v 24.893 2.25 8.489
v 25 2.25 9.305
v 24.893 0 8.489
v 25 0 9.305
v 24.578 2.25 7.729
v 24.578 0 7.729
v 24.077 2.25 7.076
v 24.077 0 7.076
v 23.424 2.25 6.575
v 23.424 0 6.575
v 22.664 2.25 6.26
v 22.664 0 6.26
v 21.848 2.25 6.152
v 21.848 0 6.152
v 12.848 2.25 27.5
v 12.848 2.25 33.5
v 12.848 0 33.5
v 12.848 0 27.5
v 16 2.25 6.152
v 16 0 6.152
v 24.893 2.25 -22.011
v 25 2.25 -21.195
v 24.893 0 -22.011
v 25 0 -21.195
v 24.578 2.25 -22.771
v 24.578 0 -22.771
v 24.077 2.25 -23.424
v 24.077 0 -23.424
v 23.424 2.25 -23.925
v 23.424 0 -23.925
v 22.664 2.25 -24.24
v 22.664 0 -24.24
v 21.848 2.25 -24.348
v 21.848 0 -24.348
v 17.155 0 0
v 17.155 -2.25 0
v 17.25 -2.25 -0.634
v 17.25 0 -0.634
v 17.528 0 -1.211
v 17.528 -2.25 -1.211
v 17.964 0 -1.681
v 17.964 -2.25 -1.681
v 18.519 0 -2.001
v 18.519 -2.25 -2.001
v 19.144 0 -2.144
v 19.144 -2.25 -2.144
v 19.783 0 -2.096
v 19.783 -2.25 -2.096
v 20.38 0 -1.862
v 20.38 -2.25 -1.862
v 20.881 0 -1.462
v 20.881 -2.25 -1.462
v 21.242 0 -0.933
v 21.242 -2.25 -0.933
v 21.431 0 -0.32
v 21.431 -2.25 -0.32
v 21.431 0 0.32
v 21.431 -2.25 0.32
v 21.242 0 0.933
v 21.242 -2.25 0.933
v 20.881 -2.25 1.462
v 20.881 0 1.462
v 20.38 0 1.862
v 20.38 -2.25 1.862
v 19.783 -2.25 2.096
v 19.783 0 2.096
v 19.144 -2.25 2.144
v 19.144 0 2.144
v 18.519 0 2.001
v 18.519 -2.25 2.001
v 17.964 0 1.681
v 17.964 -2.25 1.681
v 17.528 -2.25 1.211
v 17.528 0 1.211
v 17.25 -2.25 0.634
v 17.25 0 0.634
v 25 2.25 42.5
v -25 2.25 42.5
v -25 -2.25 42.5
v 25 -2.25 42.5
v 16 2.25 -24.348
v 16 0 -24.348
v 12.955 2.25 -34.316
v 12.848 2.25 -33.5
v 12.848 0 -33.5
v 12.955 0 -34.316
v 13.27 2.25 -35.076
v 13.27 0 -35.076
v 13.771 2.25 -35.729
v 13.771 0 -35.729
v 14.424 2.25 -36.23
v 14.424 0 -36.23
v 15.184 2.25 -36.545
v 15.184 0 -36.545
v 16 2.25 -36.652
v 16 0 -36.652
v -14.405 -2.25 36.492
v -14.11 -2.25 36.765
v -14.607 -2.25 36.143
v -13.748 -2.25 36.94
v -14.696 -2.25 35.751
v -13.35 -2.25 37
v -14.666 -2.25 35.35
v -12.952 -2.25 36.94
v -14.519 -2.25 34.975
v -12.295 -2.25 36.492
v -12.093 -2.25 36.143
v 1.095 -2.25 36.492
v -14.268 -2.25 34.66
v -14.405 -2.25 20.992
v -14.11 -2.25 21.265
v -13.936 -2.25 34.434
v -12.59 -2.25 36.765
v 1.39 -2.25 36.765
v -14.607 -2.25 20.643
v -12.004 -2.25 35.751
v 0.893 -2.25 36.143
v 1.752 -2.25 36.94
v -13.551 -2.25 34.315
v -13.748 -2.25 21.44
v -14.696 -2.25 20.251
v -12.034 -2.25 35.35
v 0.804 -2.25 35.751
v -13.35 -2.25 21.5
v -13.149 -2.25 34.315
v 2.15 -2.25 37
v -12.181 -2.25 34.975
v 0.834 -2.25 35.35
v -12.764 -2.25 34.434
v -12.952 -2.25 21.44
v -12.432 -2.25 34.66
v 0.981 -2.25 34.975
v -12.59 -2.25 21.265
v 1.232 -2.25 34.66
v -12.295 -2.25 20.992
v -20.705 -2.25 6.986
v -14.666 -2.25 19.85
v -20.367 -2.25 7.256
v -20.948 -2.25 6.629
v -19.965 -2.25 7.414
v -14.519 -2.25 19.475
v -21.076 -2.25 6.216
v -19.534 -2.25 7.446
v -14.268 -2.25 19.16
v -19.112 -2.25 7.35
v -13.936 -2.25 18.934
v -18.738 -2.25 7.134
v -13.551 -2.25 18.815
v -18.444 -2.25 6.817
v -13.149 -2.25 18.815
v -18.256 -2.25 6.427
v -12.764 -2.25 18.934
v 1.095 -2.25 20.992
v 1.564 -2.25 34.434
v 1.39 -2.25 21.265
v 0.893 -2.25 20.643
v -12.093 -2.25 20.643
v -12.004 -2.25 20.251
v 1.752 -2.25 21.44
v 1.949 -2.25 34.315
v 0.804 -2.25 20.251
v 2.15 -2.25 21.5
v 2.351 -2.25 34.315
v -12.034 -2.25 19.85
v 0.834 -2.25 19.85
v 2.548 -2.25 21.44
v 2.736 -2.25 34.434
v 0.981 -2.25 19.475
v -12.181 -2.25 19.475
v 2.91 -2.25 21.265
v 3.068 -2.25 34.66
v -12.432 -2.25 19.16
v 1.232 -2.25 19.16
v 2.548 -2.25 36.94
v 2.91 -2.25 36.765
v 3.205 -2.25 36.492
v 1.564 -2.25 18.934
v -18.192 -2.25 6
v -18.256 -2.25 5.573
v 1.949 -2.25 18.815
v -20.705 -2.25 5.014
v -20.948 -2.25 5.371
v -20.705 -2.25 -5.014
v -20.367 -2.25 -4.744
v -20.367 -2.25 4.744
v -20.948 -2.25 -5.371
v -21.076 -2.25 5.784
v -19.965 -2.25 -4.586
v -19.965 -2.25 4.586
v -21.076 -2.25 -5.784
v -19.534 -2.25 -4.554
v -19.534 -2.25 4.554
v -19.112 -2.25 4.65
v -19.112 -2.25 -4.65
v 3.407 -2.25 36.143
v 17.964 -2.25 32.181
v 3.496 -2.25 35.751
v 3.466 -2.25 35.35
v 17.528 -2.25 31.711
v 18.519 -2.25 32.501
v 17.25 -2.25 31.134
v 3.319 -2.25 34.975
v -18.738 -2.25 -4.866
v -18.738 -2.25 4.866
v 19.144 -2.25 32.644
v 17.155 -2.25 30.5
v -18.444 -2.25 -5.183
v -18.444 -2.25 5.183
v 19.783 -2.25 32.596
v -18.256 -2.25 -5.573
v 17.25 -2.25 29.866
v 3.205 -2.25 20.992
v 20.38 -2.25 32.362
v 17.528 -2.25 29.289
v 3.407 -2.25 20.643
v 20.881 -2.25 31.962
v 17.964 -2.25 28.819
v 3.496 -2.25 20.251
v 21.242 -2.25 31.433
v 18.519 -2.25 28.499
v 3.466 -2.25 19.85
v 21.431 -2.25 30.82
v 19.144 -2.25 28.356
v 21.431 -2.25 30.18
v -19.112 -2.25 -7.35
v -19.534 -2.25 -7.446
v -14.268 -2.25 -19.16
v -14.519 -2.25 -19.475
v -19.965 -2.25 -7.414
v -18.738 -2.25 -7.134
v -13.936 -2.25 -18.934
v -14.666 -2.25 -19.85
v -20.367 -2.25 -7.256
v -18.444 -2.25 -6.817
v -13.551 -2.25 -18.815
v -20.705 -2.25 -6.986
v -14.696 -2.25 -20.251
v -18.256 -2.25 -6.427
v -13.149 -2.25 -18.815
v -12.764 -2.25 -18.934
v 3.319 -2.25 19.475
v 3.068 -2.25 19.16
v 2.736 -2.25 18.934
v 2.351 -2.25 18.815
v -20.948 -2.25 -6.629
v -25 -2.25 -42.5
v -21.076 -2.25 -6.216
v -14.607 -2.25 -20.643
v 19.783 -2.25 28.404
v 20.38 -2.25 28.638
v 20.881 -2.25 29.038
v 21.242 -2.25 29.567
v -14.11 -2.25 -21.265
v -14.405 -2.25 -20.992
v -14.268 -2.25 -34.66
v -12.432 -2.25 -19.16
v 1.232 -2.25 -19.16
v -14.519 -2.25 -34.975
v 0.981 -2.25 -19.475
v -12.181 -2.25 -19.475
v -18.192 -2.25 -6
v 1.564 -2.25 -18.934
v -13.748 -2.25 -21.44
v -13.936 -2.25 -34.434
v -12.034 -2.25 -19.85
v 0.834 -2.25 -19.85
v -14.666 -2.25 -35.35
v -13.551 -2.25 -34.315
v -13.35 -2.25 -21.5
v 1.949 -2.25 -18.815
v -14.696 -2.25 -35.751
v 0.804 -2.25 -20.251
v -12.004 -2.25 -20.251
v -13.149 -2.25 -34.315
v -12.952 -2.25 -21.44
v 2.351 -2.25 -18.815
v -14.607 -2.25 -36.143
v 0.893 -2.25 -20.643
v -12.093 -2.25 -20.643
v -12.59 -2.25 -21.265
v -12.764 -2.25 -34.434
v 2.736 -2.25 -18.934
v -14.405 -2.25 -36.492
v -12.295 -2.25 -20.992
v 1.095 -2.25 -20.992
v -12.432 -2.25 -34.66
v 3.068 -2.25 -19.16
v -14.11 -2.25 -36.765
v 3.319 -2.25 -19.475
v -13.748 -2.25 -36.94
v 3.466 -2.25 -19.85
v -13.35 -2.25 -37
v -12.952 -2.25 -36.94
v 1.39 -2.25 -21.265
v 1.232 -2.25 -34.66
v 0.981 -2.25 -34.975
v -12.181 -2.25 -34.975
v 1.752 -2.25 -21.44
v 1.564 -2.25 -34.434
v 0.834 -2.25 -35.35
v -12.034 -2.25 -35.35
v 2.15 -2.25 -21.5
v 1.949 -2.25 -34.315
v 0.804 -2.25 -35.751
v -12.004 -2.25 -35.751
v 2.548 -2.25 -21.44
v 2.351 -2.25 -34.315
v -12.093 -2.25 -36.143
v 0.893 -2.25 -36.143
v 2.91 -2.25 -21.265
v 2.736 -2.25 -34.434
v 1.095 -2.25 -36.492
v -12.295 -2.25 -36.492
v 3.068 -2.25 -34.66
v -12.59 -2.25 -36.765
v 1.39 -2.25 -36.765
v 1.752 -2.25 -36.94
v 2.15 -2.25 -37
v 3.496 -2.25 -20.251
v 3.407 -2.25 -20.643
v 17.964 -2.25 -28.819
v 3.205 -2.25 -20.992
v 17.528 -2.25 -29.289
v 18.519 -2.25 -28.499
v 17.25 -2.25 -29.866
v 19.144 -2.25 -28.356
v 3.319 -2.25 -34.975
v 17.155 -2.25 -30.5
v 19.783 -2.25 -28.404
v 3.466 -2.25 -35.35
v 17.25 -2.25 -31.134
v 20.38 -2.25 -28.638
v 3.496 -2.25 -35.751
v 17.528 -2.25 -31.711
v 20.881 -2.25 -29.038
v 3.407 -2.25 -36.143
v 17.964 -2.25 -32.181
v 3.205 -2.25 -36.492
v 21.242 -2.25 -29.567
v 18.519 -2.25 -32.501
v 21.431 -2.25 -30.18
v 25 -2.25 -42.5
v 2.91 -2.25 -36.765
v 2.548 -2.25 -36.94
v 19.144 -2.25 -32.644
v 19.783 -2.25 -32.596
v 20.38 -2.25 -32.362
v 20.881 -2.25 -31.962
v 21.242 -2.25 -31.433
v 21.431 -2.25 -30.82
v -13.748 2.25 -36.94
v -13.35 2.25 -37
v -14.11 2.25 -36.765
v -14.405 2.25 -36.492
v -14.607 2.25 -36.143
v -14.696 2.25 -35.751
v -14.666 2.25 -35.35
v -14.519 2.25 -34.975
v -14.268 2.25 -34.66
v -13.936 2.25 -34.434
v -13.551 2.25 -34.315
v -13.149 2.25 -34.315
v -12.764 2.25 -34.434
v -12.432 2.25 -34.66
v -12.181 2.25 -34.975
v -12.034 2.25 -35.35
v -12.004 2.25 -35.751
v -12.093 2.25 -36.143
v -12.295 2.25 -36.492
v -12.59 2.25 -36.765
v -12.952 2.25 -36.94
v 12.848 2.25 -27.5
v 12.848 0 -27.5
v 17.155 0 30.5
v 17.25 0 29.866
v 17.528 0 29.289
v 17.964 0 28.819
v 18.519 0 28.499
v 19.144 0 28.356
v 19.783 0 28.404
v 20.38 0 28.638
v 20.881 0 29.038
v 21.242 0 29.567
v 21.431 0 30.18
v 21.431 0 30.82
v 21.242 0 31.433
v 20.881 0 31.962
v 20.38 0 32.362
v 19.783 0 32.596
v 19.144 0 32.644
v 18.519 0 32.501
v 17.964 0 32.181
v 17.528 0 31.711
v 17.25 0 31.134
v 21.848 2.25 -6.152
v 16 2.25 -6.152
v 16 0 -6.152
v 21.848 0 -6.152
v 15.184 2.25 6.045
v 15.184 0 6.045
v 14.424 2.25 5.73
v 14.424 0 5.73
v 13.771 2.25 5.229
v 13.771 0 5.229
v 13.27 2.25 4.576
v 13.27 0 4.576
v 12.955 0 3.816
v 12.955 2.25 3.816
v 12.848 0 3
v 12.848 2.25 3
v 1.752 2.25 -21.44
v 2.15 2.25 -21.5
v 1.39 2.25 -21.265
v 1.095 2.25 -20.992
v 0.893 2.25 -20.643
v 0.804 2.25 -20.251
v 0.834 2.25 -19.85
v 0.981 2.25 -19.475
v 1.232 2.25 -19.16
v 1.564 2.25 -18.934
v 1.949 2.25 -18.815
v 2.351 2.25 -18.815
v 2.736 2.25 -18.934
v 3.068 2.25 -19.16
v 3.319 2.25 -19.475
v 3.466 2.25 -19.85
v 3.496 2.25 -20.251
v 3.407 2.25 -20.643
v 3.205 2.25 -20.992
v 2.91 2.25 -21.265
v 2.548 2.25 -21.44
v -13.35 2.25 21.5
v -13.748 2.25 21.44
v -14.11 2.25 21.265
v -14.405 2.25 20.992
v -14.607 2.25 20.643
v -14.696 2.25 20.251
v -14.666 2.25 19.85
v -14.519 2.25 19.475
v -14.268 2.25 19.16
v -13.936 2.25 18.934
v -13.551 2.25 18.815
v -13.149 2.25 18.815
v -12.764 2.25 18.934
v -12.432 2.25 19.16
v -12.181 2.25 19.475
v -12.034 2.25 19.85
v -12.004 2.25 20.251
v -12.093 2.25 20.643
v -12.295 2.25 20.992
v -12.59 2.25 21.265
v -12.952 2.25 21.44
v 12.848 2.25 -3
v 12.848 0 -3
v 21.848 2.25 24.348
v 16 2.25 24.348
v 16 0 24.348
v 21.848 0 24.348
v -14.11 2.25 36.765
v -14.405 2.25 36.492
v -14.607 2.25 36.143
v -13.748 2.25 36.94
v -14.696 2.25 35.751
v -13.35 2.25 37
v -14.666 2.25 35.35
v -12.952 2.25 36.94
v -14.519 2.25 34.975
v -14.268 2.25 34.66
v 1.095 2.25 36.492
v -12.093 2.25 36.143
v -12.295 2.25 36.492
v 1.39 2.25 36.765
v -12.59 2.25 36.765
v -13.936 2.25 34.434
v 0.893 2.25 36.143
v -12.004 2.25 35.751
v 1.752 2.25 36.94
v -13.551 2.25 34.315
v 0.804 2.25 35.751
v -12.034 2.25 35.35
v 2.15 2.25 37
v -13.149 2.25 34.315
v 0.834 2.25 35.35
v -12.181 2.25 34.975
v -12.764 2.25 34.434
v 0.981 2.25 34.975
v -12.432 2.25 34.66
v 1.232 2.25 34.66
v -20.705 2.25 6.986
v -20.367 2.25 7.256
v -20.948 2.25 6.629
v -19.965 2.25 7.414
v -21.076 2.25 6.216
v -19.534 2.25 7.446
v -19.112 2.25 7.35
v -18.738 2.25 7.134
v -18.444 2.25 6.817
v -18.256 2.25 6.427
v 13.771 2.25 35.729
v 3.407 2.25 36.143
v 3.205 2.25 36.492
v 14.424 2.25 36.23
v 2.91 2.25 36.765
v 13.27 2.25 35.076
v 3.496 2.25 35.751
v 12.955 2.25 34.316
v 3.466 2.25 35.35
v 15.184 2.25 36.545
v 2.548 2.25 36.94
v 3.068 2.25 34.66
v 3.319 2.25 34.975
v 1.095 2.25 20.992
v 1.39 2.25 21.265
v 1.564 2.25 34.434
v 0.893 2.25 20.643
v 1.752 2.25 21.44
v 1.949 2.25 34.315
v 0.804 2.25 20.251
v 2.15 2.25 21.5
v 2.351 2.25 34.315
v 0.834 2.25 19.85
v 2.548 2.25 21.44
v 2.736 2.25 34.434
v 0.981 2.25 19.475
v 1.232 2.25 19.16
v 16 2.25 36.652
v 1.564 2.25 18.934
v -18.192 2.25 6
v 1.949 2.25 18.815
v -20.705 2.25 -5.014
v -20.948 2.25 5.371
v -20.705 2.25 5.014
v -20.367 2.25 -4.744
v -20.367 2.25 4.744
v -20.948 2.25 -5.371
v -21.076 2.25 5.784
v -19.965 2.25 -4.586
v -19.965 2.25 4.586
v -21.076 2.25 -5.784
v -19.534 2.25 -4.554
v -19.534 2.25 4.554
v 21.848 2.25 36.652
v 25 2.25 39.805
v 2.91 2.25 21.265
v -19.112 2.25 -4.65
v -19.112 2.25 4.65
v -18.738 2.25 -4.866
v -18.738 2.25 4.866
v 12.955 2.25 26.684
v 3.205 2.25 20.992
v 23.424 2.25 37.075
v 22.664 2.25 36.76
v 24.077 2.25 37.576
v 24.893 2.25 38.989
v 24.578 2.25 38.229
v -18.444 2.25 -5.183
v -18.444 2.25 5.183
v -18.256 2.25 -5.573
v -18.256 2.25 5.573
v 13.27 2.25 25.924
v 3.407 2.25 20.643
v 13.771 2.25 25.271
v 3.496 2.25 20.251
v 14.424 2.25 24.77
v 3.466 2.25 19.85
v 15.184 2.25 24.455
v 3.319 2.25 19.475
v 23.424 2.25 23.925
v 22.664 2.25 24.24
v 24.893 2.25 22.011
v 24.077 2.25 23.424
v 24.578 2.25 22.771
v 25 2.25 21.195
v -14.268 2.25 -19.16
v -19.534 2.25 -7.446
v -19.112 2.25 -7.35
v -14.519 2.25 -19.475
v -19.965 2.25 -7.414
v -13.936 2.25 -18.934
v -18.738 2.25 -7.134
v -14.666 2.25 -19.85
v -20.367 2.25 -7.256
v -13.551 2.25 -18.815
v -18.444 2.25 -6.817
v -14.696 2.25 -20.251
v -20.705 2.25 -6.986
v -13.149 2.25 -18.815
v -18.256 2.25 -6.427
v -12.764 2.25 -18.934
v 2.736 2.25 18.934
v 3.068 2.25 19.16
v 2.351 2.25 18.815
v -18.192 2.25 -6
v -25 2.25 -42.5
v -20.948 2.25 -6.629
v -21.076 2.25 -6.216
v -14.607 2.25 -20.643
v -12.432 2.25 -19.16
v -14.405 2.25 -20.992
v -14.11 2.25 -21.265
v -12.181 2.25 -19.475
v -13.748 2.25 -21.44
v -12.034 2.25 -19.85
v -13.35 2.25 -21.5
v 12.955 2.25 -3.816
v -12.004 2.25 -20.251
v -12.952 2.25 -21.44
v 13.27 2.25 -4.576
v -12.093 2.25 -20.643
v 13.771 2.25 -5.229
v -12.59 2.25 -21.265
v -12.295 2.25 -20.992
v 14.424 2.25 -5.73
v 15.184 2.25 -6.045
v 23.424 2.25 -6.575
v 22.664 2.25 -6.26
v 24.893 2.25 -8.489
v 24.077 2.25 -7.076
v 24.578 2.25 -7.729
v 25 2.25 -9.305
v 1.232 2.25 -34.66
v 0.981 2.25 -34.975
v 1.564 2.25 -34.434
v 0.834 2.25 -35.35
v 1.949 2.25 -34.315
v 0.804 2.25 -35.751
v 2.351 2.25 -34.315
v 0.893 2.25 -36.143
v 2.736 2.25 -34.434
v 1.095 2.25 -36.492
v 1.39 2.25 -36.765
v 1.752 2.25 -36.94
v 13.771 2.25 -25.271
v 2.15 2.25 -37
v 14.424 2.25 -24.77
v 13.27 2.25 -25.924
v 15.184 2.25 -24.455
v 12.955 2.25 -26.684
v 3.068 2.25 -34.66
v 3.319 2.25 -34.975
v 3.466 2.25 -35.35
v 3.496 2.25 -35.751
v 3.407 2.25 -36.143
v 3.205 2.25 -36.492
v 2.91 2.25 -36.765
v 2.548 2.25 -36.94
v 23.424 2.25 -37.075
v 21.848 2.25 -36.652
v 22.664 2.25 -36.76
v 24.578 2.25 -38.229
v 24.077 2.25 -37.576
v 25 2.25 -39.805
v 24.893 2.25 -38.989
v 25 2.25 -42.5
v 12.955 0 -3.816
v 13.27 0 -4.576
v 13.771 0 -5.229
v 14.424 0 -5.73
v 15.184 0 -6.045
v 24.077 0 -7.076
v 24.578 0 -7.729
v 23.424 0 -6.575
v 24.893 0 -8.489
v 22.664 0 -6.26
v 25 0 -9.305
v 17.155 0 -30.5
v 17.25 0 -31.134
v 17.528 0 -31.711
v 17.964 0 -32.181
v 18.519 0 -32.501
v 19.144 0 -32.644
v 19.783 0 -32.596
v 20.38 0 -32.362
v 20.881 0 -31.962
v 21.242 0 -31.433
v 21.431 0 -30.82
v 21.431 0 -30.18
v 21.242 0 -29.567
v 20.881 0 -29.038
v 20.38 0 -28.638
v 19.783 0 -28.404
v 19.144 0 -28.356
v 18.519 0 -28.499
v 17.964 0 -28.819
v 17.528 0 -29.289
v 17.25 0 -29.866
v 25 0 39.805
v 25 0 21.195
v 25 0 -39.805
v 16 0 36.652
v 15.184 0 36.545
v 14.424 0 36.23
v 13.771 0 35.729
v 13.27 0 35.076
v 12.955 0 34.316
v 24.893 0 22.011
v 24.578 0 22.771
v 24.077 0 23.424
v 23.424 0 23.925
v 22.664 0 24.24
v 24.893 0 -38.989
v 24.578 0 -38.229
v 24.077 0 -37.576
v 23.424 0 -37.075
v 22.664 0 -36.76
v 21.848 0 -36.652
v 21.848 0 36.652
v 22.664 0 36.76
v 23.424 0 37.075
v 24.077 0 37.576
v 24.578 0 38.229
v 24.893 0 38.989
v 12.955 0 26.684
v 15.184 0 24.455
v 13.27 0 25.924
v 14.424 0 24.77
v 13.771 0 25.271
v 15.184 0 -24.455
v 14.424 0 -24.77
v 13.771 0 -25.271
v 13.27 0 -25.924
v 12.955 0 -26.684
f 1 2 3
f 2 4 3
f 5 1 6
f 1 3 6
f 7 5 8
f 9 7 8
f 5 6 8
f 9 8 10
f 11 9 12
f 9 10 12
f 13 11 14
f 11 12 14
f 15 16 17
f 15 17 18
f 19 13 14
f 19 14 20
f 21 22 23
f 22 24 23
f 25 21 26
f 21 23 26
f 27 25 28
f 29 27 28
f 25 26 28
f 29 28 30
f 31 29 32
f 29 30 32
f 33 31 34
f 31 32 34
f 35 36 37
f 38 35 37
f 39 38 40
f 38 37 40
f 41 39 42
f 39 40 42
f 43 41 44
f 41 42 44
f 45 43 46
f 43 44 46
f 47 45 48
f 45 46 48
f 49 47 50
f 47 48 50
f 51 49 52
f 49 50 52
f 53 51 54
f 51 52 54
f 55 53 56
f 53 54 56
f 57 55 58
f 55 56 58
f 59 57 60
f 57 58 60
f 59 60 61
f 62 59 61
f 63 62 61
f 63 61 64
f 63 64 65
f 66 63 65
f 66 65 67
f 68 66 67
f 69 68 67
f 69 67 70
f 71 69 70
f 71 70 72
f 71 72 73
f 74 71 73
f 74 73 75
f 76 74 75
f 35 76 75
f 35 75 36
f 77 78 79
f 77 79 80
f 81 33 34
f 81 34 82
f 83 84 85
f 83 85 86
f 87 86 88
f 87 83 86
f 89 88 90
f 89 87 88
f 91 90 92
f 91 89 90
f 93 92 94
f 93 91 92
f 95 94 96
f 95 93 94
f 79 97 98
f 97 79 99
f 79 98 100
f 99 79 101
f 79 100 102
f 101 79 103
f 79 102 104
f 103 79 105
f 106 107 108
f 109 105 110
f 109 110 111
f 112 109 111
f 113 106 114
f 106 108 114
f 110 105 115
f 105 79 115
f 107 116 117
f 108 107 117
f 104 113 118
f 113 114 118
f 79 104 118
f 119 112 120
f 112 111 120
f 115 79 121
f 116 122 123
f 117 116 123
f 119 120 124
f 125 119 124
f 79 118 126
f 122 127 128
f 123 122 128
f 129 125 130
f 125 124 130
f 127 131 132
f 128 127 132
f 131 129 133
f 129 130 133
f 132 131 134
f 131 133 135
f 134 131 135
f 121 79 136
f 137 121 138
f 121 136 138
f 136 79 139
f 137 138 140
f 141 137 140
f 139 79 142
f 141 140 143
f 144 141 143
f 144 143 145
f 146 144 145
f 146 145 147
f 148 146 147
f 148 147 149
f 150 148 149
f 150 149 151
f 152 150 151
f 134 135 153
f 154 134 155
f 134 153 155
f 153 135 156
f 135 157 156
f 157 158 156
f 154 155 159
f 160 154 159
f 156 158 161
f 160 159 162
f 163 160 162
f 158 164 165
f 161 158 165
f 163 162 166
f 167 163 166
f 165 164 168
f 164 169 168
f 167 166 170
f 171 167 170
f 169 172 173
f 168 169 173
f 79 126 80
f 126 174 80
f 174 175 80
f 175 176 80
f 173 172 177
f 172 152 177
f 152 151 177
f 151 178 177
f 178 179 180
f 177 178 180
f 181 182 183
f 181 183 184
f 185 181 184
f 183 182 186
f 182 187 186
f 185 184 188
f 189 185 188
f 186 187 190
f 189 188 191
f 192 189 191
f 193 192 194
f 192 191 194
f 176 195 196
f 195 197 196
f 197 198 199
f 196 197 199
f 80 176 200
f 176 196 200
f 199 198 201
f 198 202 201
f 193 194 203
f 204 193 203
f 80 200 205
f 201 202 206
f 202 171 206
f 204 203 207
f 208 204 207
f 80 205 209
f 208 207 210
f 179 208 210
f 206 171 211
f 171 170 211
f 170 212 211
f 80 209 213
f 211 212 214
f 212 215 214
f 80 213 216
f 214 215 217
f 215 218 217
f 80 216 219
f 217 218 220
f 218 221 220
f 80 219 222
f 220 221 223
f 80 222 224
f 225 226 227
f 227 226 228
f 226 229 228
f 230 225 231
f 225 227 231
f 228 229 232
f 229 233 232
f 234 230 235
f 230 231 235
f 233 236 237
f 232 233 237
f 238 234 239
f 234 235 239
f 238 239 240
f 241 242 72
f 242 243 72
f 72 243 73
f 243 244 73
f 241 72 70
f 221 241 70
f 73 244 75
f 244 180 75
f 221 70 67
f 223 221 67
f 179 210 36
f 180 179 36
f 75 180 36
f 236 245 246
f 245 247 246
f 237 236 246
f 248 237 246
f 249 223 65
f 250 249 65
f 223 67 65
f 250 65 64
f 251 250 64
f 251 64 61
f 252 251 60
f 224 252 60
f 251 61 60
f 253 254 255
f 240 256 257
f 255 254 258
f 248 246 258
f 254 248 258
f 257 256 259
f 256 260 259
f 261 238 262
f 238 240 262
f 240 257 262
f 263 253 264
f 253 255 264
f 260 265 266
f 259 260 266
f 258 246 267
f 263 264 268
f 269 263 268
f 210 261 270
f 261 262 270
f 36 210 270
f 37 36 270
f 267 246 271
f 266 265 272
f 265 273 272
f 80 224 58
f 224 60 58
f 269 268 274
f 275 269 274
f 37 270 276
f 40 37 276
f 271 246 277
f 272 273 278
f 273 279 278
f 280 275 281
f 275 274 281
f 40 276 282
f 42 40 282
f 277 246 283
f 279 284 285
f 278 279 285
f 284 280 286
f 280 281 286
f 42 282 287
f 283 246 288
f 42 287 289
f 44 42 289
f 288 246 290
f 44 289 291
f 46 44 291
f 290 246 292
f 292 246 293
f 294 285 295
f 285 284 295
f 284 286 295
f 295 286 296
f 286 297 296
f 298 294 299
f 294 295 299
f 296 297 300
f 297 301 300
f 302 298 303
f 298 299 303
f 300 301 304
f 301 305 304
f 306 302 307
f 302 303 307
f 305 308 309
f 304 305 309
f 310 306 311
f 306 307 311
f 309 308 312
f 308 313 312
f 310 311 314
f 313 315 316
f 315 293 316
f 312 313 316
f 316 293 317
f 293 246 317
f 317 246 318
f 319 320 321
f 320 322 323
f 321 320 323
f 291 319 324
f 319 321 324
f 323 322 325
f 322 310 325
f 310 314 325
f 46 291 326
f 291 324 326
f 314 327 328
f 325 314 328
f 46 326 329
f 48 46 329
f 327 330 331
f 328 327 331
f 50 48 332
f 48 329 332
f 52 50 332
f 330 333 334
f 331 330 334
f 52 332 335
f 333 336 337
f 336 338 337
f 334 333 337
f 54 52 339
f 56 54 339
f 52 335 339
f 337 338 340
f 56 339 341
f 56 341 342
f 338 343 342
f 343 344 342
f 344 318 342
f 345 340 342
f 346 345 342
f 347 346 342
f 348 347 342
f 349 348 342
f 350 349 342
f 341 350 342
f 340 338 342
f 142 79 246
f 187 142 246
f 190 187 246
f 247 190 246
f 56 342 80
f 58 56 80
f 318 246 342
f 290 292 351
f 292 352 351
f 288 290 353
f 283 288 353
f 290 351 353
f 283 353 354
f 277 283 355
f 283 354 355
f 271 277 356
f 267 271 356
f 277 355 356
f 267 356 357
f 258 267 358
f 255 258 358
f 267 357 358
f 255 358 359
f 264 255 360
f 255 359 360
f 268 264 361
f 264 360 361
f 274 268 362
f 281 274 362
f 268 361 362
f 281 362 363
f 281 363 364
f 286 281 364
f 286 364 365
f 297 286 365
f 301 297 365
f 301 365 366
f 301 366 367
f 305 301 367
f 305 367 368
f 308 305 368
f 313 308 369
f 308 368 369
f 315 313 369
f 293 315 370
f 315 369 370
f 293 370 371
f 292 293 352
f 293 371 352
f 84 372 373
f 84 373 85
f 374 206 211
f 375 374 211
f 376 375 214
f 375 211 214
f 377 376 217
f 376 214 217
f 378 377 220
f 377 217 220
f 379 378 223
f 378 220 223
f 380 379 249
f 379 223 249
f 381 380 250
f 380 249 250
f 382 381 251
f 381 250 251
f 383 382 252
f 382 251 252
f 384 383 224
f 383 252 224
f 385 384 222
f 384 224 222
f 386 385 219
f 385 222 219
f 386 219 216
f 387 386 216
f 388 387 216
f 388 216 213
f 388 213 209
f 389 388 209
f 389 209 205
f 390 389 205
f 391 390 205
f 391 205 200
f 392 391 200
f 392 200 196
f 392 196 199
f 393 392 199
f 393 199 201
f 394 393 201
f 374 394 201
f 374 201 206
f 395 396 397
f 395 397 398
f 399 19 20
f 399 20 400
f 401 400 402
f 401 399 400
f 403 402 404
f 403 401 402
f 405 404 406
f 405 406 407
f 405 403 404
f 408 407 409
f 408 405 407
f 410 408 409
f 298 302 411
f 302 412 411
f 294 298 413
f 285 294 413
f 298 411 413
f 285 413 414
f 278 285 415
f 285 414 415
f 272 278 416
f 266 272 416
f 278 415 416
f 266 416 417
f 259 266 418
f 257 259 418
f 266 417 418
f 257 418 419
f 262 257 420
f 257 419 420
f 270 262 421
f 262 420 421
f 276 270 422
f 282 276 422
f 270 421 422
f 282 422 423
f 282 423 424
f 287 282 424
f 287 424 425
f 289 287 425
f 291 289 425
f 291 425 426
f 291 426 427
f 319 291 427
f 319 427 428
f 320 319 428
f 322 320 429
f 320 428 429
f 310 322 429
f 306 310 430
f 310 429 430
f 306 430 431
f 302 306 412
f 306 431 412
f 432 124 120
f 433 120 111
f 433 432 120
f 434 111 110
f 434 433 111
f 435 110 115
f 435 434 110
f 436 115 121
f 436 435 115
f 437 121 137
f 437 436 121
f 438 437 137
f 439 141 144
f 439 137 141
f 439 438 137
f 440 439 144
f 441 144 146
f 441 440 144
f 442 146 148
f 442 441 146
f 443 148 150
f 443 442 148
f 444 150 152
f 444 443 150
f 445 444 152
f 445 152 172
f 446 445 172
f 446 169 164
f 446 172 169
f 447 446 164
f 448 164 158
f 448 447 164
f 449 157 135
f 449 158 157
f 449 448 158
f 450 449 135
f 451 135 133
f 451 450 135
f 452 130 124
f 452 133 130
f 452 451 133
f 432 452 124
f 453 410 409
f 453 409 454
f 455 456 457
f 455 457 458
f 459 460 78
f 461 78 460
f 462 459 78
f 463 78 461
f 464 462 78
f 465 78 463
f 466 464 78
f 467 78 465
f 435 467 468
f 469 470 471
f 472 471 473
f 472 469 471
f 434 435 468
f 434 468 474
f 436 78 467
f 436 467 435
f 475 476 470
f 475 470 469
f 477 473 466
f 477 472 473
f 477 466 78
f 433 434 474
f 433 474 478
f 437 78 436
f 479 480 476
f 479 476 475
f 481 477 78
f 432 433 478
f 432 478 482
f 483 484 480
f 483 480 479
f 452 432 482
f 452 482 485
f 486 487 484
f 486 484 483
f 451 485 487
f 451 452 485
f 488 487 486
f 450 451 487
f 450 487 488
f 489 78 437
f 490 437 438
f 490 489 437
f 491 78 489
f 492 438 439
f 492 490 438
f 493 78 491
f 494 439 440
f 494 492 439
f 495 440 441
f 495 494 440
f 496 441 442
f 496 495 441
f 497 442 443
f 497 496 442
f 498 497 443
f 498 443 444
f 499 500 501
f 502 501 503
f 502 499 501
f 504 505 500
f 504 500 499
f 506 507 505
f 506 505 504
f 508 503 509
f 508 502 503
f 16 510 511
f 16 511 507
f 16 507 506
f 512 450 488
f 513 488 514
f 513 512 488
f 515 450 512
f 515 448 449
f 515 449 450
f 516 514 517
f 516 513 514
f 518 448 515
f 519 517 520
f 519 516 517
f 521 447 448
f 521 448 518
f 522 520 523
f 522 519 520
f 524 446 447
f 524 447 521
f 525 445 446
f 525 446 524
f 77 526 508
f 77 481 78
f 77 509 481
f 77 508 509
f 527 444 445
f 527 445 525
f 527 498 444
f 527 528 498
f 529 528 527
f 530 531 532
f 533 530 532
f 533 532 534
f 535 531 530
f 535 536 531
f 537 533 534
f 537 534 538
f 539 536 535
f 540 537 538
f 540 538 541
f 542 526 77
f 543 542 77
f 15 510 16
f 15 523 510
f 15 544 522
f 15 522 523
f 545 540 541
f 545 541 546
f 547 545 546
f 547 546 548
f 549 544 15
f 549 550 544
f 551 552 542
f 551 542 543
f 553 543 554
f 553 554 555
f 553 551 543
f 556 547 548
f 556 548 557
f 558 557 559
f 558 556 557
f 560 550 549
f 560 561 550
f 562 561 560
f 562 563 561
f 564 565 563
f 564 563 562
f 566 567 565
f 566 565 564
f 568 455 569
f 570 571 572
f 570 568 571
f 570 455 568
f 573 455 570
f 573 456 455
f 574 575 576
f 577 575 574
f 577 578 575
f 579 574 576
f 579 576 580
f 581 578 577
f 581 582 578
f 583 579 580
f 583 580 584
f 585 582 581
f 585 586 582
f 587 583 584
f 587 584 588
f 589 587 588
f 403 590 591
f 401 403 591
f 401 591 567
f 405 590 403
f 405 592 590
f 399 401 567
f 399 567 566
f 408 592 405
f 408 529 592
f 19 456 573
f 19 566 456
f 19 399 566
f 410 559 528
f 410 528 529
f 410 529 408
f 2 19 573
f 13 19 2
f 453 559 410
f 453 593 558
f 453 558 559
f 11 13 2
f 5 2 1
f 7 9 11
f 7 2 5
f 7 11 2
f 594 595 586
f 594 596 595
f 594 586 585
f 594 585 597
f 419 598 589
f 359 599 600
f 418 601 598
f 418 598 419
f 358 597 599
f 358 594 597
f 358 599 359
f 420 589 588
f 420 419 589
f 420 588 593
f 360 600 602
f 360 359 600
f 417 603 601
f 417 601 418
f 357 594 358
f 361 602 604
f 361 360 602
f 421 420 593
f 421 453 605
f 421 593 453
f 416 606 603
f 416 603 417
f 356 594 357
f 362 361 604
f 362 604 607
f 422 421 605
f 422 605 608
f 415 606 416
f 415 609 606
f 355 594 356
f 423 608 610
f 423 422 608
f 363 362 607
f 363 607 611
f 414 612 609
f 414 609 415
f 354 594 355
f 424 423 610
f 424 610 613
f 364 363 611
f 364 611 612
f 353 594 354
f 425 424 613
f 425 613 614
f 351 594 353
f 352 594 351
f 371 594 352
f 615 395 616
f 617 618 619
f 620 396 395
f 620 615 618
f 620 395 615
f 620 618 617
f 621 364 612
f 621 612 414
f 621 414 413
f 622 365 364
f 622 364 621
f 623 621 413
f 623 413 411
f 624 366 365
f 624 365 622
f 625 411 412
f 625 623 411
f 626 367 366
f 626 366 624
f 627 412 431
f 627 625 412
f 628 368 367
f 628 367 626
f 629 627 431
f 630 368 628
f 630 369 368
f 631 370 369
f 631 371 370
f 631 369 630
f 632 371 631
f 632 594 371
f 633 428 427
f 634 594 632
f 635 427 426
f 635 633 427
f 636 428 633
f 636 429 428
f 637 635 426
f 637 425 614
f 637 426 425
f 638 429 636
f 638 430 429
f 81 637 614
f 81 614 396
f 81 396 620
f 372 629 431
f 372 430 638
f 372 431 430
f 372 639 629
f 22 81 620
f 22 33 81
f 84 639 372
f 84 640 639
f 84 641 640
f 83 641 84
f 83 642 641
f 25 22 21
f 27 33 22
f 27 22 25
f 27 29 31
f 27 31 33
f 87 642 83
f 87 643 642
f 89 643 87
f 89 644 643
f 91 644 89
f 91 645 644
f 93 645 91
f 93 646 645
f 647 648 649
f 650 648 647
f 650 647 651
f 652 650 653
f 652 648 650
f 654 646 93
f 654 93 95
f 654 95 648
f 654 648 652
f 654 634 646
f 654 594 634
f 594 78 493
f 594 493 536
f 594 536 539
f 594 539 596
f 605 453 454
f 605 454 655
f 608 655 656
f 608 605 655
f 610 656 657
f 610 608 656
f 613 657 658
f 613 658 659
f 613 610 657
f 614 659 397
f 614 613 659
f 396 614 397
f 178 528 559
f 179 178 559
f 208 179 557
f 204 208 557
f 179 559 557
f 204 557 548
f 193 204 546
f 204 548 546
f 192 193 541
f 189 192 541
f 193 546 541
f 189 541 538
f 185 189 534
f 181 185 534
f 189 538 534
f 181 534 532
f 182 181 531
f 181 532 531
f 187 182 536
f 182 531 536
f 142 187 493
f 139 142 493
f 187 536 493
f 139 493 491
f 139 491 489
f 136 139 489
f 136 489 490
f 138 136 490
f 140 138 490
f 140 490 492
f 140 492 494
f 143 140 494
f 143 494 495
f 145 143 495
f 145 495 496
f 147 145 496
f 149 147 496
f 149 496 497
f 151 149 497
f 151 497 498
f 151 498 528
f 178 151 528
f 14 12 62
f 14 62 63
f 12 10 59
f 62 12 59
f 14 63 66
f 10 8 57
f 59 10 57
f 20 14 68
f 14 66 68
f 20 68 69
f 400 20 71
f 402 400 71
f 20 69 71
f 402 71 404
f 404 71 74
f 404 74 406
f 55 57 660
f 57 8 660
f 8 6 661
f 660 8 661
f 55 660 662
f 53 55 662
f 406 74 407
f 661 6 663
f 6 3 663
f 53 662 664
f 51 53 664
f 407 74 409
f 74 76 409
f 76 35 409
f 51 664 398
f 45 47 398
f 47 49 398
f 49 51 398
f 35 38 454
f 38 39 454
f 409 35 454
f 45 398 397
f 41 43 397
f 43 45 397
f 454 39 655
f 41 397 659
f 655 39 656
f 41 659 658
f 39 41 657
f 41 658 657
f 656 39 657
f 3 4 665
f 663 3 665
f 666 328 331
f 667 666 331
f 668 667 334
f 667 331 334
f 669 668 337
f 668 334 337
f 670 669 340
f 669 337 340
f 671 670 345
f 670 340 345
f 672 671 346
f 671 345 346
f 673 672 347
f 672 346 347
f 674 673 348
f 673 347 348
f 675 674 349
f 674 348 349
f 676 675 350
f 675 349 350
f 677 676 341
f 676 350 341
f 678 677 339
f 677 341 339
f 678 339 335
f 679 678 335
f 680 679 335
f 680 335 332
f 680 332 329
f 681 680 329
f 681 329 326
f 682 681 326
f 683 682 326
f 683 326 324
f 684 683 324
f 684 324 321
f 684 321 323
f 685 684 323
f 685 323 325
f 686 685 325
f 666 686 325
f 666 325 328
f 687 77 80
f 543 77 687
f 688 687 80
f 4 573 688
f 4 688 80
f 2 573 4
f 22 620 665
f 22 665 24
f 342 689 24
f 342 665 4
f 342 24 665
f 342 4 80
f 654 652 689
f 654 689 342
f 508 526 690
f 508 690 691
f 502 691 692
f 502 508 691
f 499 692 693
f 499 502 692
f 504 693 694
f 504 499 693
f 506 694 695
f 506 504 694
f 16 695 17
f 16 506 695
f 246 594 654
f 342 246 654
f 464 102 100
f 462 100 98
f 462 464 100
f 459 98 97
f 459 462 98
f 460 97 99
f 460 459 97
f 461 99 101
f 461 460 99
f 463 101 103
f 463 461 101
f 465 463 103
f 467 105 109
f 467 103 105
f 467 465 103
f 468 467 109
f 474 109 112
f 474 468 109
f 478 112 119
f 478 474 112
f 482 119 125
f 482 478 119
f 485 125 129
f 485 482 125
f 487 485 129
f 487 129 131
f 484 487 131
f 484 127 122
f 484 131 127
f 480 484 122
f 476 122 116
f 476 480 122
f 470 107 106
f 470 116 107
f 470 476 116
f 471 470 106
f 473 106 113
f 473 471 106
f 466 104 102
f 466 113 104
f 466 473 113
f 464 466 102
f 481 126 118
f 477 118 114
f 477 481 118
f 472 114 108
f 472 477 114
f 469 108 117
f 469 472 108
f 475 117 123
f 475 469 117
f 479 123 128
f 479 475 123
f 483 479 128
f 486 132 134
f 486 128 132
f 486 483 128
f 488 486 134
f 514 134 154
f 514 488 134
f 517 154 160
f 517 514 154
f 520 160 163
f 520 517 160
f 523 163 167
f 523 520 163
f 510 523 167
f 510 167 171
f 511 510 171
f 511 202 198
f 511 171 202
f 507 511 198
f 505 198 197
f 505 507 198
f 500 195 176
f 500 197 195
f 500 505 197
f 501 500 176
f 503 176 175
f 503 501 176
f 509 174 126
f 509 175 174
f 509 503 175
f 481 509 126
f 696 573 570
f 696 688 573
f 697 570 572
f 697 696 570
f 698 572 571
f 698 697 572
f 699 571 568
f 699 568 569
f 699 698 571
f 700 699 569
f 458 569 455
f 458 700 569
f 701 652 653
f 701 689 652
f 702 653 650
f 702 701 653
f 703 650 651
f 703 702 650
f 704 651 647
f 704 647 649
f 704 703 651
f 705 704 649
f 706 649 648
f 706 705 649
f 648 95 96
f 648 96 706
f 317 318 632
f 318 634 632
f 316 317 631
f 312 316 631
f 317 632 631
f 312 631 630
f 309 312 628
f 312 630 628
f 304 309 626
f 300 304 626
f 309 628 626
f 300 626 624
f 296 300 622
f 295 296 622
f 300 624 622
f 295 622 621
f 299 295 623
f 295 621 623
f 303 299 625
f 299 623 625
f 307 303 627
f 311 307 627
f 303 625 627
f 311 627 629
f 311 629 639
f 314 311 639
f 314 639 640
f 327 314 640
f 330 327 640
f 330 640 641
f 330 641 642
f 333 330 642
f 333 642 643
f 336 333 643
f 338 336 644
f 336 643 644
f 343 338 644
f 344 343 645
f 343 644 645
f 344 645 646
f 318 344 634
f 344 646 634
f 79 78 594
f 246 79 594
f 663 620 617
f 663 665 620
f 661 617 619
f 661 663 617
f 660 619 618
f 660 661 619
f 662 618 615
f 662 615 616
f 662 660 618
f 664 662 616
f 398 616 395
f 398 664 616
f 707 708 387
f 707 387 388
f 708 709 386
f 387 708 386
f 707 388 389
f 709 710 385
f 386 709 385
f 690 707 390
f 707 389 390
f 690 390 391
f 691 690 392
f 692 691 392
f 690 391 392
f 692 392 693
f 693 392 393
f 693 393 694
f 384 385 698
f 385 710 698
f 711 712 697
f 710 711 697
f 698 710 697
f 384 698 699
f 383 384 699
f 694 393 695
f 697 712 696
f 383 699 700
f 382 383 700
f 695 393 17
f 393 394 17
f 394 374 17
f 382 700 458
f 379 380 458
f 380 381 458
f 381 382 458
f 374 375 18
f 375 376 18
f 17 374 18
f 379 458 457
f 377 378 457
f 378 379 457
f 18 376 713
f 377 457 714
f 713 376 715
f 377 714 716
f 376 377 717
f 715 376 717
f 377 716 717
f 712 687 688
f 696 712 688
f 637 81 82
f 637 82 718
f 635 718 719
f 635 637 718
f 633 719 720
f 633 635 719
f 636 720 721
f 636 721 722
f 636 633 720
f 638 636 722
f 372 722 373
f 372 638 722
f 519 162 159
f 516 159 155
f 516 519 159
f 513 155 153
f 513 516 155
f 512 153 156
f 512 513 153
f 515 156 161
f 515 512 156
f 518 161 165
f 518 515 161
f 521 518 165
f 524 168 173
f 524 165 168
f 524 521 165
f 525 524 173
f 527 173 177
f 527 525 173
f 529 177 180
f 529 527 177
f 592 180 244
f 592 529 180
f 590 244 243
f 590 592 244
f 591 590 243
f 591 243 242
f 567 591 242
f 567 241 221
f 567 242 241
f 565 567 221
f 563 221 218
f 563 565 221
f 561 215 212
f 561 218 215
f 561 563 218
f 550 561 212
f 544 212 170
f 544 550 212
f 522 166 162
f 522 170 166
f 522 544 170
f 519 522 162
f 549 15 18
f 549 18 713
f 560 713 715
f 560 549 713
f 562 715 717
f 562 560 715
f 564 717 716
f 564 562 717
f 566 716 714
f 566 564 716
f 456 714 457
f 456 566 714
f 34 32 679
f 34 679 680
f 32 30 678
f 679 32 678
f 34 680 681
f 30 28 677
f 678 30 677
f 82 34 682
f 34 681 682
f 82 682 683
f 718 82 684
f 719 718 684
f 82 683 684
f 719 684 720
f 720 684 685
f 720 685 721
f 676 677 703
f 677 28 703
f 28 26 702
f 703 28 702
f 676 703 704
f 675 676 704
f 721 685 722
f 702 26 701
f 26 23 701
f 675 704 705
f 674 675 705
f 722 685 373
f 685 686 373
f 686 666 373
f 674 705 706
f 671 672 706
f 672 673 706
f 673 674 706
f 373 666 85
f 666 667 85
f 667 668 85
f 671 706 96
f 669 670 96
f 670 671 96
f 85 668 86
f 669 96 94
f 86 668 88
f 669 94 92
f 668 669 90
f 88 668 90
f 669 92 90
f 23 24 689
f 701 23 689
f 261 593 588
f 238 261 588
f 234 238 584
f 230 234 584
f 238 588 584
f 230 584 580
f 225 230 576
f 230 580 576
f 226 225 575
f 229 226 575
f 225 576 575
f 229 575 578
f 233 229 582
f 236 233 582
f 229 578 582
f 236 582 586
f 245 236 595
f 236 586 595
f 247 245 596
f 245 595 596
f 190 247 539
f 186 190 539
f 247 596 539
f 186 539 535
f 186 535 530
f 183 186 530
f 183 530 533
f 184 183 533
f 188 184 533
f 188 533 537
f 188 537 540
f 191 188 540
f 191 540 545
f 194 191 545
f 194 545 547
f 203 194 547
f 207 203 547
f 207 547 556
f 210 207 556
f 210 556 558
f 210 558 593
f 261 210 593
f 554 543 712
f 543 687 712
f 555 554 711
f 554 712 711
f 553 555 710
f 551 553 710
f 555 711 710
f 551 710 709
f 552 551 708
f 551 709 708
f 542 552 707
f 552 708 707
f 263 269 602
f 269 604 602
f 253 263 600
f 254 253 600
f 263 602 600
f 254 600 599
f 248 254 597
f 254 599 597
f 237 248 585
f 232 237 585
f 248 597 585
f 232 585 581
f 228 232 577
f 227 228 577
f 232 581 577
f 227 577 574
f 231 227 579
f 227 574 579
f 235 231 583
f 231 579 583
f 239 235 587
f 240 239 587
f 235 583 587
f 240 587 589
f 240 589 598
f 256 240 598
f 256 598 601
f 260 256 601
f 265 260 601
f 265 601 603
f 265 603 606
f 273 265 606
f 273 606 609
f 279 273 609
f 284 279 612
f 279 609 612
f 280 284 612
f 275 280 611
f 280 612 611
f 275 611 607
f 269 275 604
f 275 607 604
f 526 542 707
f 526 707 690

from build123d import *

# Parameters (mm, degrees)
SKETCH1_W                       = 50
SKETCH1_H                       = 95
BOSS_EXTRUDE1_DEPTH             = 2.25
M2_5_CLEARANCE_HOLE1_AT_2_COUNT = 2
M2_5_CLEARANCE_HOLE1_AT_2_PITCH = 15.5
M2_5_CLEARANCE_HOLE1_AT_3_COUNT = 2
M2_5_CLEARANCE_HOLE1_AT_3_PITCH = 21.920310217
M2_5_CLEARANCE_HOLE1_AT_4_COUNT = 2
M2_5_CLEARANCE_HOLE1_AT_4_PITCH = 15.5
SKETCH4_W                       = 50
SKETCH4_H                       = 5
CUT_EXTRUDE1_DEPTH              = 54.865573421
CUT_EXTRUDE2_DEPTH              = 2.25
M4_CLEARANCE_HOLE1_D            = 4.3
M4_CLEARANCE_HOLE1_DEPTH        = 10.1
M4_CLEARANCE_HOLE1_TIP          = 1.291850331
FILLET1_R                       = 3.1524
M2_5_CLEARANCE_HOLE2_D          = 2.9


with BuildPart() as part:
    # Sketch1 → Boss-Extrude1 (new, symmetric)
    with BuildSketch(Plane(origin=(0, 0, 0), x_dir=(1, 0, 0), z_dir=(0, 1, 0))):
        Rectangle(SKETCH1_W, SKETCH1_H)
    extrude(amount=BOSS_EXTRUDE1_DEPTH, both=True)

    # Sketch3 → M2.5 Clearance Hole1 (revolve, cut)
    with BuildSketch(Plane(origin=(2.15, 2.25, 20.15), x_dir=(0, 0, 1), z_dir=(1, 0, 0))):
        Polygon((0, 0), (0, 7.161161836), (1.35, 6.35), (1.35, 0), align=None)
    m2_5_clearance_hole1 = revolve(axis=Axis((2.15, 8.6, 20.15), (0, -1, 0)), mode=Mode.SUBTRACT)

    # M2.5 Clearance Hole1 at 2: M2.5 Clearance Hole1 ×2
    with Locations(*[(0, 0, i * M2_5_CLEARANCE_HOLE1_AT_2_PITCH) for i in range(1, M2_5_CLEARANCE_HOLE1_AT_2_COUNT)]):
        add(m2_5_clearance_hole1, mode=Mode.SUBTRACT)

    # M2.5 Clearance Hole1 at 3: M2.5 Clearance Hole1 ×2
    with Locations(*[Vector(-0.7071067811865477, 0, 0.7071067811865475) * (i * M2_5_CLEARANCE_HOLE1_AT_3_PITCH) for i in range(1, M2_5_CLEARANCE_HOLE1_AT_3_COUNT)]):
        add(m2_5_clearance_hole1, mode=Mode.SUBTRACT)

    # M2.5 Clearance Hole1 at 4: M2.5 Clearance Hole1 ×2
    with Locations(*[(-i * M2_5_CLEARANCE_HOLE1_AT_4_PITCH, 0, 0) for i in range(1, M2_5_CLEARANCE_HOLE1_AT_4_COUNT)]):
        add(m2_5_clearance_hole1, mode=Mode.SUBTRACT)

    # Sketch4 → Cut-Extrude1 (cut, through all)
    with BuildSketch(Plane(origin=(0, 2.25, 0), x_dir=(1, 0, 0), z_dir=(0, 1, 0))):
        with Locations((0, -45)):
            Rectangle(SKETCH4_W, SKETCH4_H)
    cut_extrude1 = extrude(amount=-CUT_EXTRUDE1_DEPTH, mode=Mode.SUBTRACT)

    # Mirror1: M2.5 Clearance Hole1, Cut-Extrude1 across plane
    add(m2_5_clearance_hole1.mirror(Plane.XY), mode=Mode.SUBTRACT)
    add(cut_extrude1.mirror(Plane.XY), mode=Mode.SUBTRACT)

    # Mirror1 copy 1 sketch → Mirror1 copy 1 (revolve, cut)
    with BuildSketch(Plane(origin=(2.15, 2.25, -35.65), x_dir=(0, 0, -1), z_dir=(1, 0, 0))):
        Polygon((0, 0), (0, -7.161161836), (1.35, -6.35), (1.35, 0), align=None)
    revolve(axis=Axis((2.15, 8.6, -35.65), (0, 1, 0)), mode=Mode.SUBTRACT)

    # Mirror1 copy 2 sketch → Mirror1 copy 2 (revolve, cut)
    with BuildSketch(Plane(origin=(-13.35, 2.25, -35.65), x_dir=(0, 0, -1), z_dir=(1, 0, 0))):
        Polygon((0, 0), (0, -7.161161836), (1.35, -6.35), (1.35, 0), align=None)
    revolve(axis=Axis((-13.35, 8.6, -35.65), (0, 1, 0)), mode=Mode.SUBTRACT)

    # Mirror1 copy 3 sketch → Mirror1 copy 3 (revolve, cut)
    with BuildSketch(Plane(origin=(-13.35, 2.25, -20.15), x_dir=(0, 0, -1), z_dir=(1, 0, 0))):
        Polygon((0, 0), (0, -7.161161836), (1.35, -6.35), (1.35, 0), align=None)
    revolve(axis=Axis((-13.35, 8.6, -20.15), (0, 1, 0)), mode=Mode.SUBTRACT)

    # Sketch5 → Cut-Extrude2 (cut)
    with BuildSketch(Plane(origin=(0, 2.25, 0), x_dir=(1, 0, 0), z_dir=(0, 1, 0))):
        with BuildLine():
            Line((25, -36.6524), (16, -36.6524))
            ThreePointArc((16, -36.6524), (13.770916583, -35.729083417), (12.8476, -33.5))
            Line((12.8476, -33.5), (12.8476, -27.5))
            ThreePointArc((12.8476, -27.5), (13.770916583, -25.270916583), (16, -24.3476))
            Line((16, -24.3476), (25, -24.3476))
            Line((25, -24.3476), (25, -36.6524))
        make_face()
        with BuildLine():
            Line((25, 6.1524), (25, -6.1524))
            Line((25, -6.1524), (16, -6.1524))
            ThreePointArc((16, -6.1524), (13.770916583, -5.229083417), (12.8476, -3))
            Line((12.8476, -3), (12.8476, 3))
            ThreePointArc((12.8476, 3), (13.770916583, 5.229083417), (16, 6.1524))
            Line((16, 6.1524), (25, 6.1524))
        make_face()
        with BuildLine():
            Line((25, 36.6524), (25, 24.3476))
            Line((25, 24.3476), (16, 24.3476))
            ThreePointArc((16, 24.3476), (13.770916583, 25.270916583), (12.8476, 27.5))
            Line((12.8476, 27.5), (12.8476, 33.5))
            ThreePointArc((12.8476, 33.5), (13.770916583, 35.729083417), (16, 36.6524))
            Line((16, 36.6524), (25, 36.6524))
        make_face()
    extrude(amount=-CUT_EXTRUDE2_DEPTH, mode=Mode.SUBTRACT)

    # M4 Clearance Hole1
    with Locations(Plane(origin=(0, 0, 0), x_dir=(1, 0, 0), z_dir=(0, 1, 0))):
        with Locations((19.3048, -30.5), (19.3048, 0), (19.3048, 30.5)):
            Hole(M4_CLEARANCE_HOLE1_D / 2, depth=M4_CLEARANCE_HOLE1_DEPTH)
            with Locations((0, 0, -(M4_CLEARANCE_HOLE1_DEPTH + M4_CLEARANCE_HOLE1_TIP / 2))):  # 118° drill point
                Cone(0, M4_CLEARANCE_HOLE1_D / 2, M4_CLEARANCE_HOLE1_TIP, mode=Mode.SUBTRACT)

    # Fillet1
    fillet1_edges = [part.edges().sort_by_distance(p)[0] for p in [
        (25, 1.125, 24.3476),
        (25, 1.125, 36.6524),
        (25, 1.125, 6.1524),
        (25, 1.125, -6.1524),
        (25, 1.125, -24.3476),
        (25, 1.125, -36.6524),
    ]]
    fillet(fillet1_edges, radius=FILLET1_R)

    # M2.5 Clearance Hole2 (through all)
    with Locations(Plane(origin=(0, -2.25, 0), x_dir=(-1, 0, 0), z_dir=(0, -1, 0))):
        with Locations((19.641987941, 6), (19.641987941, -6)):
            Hole(M2_5_CLEARANCE_HOLE2_D / 2)


solid = part.part
